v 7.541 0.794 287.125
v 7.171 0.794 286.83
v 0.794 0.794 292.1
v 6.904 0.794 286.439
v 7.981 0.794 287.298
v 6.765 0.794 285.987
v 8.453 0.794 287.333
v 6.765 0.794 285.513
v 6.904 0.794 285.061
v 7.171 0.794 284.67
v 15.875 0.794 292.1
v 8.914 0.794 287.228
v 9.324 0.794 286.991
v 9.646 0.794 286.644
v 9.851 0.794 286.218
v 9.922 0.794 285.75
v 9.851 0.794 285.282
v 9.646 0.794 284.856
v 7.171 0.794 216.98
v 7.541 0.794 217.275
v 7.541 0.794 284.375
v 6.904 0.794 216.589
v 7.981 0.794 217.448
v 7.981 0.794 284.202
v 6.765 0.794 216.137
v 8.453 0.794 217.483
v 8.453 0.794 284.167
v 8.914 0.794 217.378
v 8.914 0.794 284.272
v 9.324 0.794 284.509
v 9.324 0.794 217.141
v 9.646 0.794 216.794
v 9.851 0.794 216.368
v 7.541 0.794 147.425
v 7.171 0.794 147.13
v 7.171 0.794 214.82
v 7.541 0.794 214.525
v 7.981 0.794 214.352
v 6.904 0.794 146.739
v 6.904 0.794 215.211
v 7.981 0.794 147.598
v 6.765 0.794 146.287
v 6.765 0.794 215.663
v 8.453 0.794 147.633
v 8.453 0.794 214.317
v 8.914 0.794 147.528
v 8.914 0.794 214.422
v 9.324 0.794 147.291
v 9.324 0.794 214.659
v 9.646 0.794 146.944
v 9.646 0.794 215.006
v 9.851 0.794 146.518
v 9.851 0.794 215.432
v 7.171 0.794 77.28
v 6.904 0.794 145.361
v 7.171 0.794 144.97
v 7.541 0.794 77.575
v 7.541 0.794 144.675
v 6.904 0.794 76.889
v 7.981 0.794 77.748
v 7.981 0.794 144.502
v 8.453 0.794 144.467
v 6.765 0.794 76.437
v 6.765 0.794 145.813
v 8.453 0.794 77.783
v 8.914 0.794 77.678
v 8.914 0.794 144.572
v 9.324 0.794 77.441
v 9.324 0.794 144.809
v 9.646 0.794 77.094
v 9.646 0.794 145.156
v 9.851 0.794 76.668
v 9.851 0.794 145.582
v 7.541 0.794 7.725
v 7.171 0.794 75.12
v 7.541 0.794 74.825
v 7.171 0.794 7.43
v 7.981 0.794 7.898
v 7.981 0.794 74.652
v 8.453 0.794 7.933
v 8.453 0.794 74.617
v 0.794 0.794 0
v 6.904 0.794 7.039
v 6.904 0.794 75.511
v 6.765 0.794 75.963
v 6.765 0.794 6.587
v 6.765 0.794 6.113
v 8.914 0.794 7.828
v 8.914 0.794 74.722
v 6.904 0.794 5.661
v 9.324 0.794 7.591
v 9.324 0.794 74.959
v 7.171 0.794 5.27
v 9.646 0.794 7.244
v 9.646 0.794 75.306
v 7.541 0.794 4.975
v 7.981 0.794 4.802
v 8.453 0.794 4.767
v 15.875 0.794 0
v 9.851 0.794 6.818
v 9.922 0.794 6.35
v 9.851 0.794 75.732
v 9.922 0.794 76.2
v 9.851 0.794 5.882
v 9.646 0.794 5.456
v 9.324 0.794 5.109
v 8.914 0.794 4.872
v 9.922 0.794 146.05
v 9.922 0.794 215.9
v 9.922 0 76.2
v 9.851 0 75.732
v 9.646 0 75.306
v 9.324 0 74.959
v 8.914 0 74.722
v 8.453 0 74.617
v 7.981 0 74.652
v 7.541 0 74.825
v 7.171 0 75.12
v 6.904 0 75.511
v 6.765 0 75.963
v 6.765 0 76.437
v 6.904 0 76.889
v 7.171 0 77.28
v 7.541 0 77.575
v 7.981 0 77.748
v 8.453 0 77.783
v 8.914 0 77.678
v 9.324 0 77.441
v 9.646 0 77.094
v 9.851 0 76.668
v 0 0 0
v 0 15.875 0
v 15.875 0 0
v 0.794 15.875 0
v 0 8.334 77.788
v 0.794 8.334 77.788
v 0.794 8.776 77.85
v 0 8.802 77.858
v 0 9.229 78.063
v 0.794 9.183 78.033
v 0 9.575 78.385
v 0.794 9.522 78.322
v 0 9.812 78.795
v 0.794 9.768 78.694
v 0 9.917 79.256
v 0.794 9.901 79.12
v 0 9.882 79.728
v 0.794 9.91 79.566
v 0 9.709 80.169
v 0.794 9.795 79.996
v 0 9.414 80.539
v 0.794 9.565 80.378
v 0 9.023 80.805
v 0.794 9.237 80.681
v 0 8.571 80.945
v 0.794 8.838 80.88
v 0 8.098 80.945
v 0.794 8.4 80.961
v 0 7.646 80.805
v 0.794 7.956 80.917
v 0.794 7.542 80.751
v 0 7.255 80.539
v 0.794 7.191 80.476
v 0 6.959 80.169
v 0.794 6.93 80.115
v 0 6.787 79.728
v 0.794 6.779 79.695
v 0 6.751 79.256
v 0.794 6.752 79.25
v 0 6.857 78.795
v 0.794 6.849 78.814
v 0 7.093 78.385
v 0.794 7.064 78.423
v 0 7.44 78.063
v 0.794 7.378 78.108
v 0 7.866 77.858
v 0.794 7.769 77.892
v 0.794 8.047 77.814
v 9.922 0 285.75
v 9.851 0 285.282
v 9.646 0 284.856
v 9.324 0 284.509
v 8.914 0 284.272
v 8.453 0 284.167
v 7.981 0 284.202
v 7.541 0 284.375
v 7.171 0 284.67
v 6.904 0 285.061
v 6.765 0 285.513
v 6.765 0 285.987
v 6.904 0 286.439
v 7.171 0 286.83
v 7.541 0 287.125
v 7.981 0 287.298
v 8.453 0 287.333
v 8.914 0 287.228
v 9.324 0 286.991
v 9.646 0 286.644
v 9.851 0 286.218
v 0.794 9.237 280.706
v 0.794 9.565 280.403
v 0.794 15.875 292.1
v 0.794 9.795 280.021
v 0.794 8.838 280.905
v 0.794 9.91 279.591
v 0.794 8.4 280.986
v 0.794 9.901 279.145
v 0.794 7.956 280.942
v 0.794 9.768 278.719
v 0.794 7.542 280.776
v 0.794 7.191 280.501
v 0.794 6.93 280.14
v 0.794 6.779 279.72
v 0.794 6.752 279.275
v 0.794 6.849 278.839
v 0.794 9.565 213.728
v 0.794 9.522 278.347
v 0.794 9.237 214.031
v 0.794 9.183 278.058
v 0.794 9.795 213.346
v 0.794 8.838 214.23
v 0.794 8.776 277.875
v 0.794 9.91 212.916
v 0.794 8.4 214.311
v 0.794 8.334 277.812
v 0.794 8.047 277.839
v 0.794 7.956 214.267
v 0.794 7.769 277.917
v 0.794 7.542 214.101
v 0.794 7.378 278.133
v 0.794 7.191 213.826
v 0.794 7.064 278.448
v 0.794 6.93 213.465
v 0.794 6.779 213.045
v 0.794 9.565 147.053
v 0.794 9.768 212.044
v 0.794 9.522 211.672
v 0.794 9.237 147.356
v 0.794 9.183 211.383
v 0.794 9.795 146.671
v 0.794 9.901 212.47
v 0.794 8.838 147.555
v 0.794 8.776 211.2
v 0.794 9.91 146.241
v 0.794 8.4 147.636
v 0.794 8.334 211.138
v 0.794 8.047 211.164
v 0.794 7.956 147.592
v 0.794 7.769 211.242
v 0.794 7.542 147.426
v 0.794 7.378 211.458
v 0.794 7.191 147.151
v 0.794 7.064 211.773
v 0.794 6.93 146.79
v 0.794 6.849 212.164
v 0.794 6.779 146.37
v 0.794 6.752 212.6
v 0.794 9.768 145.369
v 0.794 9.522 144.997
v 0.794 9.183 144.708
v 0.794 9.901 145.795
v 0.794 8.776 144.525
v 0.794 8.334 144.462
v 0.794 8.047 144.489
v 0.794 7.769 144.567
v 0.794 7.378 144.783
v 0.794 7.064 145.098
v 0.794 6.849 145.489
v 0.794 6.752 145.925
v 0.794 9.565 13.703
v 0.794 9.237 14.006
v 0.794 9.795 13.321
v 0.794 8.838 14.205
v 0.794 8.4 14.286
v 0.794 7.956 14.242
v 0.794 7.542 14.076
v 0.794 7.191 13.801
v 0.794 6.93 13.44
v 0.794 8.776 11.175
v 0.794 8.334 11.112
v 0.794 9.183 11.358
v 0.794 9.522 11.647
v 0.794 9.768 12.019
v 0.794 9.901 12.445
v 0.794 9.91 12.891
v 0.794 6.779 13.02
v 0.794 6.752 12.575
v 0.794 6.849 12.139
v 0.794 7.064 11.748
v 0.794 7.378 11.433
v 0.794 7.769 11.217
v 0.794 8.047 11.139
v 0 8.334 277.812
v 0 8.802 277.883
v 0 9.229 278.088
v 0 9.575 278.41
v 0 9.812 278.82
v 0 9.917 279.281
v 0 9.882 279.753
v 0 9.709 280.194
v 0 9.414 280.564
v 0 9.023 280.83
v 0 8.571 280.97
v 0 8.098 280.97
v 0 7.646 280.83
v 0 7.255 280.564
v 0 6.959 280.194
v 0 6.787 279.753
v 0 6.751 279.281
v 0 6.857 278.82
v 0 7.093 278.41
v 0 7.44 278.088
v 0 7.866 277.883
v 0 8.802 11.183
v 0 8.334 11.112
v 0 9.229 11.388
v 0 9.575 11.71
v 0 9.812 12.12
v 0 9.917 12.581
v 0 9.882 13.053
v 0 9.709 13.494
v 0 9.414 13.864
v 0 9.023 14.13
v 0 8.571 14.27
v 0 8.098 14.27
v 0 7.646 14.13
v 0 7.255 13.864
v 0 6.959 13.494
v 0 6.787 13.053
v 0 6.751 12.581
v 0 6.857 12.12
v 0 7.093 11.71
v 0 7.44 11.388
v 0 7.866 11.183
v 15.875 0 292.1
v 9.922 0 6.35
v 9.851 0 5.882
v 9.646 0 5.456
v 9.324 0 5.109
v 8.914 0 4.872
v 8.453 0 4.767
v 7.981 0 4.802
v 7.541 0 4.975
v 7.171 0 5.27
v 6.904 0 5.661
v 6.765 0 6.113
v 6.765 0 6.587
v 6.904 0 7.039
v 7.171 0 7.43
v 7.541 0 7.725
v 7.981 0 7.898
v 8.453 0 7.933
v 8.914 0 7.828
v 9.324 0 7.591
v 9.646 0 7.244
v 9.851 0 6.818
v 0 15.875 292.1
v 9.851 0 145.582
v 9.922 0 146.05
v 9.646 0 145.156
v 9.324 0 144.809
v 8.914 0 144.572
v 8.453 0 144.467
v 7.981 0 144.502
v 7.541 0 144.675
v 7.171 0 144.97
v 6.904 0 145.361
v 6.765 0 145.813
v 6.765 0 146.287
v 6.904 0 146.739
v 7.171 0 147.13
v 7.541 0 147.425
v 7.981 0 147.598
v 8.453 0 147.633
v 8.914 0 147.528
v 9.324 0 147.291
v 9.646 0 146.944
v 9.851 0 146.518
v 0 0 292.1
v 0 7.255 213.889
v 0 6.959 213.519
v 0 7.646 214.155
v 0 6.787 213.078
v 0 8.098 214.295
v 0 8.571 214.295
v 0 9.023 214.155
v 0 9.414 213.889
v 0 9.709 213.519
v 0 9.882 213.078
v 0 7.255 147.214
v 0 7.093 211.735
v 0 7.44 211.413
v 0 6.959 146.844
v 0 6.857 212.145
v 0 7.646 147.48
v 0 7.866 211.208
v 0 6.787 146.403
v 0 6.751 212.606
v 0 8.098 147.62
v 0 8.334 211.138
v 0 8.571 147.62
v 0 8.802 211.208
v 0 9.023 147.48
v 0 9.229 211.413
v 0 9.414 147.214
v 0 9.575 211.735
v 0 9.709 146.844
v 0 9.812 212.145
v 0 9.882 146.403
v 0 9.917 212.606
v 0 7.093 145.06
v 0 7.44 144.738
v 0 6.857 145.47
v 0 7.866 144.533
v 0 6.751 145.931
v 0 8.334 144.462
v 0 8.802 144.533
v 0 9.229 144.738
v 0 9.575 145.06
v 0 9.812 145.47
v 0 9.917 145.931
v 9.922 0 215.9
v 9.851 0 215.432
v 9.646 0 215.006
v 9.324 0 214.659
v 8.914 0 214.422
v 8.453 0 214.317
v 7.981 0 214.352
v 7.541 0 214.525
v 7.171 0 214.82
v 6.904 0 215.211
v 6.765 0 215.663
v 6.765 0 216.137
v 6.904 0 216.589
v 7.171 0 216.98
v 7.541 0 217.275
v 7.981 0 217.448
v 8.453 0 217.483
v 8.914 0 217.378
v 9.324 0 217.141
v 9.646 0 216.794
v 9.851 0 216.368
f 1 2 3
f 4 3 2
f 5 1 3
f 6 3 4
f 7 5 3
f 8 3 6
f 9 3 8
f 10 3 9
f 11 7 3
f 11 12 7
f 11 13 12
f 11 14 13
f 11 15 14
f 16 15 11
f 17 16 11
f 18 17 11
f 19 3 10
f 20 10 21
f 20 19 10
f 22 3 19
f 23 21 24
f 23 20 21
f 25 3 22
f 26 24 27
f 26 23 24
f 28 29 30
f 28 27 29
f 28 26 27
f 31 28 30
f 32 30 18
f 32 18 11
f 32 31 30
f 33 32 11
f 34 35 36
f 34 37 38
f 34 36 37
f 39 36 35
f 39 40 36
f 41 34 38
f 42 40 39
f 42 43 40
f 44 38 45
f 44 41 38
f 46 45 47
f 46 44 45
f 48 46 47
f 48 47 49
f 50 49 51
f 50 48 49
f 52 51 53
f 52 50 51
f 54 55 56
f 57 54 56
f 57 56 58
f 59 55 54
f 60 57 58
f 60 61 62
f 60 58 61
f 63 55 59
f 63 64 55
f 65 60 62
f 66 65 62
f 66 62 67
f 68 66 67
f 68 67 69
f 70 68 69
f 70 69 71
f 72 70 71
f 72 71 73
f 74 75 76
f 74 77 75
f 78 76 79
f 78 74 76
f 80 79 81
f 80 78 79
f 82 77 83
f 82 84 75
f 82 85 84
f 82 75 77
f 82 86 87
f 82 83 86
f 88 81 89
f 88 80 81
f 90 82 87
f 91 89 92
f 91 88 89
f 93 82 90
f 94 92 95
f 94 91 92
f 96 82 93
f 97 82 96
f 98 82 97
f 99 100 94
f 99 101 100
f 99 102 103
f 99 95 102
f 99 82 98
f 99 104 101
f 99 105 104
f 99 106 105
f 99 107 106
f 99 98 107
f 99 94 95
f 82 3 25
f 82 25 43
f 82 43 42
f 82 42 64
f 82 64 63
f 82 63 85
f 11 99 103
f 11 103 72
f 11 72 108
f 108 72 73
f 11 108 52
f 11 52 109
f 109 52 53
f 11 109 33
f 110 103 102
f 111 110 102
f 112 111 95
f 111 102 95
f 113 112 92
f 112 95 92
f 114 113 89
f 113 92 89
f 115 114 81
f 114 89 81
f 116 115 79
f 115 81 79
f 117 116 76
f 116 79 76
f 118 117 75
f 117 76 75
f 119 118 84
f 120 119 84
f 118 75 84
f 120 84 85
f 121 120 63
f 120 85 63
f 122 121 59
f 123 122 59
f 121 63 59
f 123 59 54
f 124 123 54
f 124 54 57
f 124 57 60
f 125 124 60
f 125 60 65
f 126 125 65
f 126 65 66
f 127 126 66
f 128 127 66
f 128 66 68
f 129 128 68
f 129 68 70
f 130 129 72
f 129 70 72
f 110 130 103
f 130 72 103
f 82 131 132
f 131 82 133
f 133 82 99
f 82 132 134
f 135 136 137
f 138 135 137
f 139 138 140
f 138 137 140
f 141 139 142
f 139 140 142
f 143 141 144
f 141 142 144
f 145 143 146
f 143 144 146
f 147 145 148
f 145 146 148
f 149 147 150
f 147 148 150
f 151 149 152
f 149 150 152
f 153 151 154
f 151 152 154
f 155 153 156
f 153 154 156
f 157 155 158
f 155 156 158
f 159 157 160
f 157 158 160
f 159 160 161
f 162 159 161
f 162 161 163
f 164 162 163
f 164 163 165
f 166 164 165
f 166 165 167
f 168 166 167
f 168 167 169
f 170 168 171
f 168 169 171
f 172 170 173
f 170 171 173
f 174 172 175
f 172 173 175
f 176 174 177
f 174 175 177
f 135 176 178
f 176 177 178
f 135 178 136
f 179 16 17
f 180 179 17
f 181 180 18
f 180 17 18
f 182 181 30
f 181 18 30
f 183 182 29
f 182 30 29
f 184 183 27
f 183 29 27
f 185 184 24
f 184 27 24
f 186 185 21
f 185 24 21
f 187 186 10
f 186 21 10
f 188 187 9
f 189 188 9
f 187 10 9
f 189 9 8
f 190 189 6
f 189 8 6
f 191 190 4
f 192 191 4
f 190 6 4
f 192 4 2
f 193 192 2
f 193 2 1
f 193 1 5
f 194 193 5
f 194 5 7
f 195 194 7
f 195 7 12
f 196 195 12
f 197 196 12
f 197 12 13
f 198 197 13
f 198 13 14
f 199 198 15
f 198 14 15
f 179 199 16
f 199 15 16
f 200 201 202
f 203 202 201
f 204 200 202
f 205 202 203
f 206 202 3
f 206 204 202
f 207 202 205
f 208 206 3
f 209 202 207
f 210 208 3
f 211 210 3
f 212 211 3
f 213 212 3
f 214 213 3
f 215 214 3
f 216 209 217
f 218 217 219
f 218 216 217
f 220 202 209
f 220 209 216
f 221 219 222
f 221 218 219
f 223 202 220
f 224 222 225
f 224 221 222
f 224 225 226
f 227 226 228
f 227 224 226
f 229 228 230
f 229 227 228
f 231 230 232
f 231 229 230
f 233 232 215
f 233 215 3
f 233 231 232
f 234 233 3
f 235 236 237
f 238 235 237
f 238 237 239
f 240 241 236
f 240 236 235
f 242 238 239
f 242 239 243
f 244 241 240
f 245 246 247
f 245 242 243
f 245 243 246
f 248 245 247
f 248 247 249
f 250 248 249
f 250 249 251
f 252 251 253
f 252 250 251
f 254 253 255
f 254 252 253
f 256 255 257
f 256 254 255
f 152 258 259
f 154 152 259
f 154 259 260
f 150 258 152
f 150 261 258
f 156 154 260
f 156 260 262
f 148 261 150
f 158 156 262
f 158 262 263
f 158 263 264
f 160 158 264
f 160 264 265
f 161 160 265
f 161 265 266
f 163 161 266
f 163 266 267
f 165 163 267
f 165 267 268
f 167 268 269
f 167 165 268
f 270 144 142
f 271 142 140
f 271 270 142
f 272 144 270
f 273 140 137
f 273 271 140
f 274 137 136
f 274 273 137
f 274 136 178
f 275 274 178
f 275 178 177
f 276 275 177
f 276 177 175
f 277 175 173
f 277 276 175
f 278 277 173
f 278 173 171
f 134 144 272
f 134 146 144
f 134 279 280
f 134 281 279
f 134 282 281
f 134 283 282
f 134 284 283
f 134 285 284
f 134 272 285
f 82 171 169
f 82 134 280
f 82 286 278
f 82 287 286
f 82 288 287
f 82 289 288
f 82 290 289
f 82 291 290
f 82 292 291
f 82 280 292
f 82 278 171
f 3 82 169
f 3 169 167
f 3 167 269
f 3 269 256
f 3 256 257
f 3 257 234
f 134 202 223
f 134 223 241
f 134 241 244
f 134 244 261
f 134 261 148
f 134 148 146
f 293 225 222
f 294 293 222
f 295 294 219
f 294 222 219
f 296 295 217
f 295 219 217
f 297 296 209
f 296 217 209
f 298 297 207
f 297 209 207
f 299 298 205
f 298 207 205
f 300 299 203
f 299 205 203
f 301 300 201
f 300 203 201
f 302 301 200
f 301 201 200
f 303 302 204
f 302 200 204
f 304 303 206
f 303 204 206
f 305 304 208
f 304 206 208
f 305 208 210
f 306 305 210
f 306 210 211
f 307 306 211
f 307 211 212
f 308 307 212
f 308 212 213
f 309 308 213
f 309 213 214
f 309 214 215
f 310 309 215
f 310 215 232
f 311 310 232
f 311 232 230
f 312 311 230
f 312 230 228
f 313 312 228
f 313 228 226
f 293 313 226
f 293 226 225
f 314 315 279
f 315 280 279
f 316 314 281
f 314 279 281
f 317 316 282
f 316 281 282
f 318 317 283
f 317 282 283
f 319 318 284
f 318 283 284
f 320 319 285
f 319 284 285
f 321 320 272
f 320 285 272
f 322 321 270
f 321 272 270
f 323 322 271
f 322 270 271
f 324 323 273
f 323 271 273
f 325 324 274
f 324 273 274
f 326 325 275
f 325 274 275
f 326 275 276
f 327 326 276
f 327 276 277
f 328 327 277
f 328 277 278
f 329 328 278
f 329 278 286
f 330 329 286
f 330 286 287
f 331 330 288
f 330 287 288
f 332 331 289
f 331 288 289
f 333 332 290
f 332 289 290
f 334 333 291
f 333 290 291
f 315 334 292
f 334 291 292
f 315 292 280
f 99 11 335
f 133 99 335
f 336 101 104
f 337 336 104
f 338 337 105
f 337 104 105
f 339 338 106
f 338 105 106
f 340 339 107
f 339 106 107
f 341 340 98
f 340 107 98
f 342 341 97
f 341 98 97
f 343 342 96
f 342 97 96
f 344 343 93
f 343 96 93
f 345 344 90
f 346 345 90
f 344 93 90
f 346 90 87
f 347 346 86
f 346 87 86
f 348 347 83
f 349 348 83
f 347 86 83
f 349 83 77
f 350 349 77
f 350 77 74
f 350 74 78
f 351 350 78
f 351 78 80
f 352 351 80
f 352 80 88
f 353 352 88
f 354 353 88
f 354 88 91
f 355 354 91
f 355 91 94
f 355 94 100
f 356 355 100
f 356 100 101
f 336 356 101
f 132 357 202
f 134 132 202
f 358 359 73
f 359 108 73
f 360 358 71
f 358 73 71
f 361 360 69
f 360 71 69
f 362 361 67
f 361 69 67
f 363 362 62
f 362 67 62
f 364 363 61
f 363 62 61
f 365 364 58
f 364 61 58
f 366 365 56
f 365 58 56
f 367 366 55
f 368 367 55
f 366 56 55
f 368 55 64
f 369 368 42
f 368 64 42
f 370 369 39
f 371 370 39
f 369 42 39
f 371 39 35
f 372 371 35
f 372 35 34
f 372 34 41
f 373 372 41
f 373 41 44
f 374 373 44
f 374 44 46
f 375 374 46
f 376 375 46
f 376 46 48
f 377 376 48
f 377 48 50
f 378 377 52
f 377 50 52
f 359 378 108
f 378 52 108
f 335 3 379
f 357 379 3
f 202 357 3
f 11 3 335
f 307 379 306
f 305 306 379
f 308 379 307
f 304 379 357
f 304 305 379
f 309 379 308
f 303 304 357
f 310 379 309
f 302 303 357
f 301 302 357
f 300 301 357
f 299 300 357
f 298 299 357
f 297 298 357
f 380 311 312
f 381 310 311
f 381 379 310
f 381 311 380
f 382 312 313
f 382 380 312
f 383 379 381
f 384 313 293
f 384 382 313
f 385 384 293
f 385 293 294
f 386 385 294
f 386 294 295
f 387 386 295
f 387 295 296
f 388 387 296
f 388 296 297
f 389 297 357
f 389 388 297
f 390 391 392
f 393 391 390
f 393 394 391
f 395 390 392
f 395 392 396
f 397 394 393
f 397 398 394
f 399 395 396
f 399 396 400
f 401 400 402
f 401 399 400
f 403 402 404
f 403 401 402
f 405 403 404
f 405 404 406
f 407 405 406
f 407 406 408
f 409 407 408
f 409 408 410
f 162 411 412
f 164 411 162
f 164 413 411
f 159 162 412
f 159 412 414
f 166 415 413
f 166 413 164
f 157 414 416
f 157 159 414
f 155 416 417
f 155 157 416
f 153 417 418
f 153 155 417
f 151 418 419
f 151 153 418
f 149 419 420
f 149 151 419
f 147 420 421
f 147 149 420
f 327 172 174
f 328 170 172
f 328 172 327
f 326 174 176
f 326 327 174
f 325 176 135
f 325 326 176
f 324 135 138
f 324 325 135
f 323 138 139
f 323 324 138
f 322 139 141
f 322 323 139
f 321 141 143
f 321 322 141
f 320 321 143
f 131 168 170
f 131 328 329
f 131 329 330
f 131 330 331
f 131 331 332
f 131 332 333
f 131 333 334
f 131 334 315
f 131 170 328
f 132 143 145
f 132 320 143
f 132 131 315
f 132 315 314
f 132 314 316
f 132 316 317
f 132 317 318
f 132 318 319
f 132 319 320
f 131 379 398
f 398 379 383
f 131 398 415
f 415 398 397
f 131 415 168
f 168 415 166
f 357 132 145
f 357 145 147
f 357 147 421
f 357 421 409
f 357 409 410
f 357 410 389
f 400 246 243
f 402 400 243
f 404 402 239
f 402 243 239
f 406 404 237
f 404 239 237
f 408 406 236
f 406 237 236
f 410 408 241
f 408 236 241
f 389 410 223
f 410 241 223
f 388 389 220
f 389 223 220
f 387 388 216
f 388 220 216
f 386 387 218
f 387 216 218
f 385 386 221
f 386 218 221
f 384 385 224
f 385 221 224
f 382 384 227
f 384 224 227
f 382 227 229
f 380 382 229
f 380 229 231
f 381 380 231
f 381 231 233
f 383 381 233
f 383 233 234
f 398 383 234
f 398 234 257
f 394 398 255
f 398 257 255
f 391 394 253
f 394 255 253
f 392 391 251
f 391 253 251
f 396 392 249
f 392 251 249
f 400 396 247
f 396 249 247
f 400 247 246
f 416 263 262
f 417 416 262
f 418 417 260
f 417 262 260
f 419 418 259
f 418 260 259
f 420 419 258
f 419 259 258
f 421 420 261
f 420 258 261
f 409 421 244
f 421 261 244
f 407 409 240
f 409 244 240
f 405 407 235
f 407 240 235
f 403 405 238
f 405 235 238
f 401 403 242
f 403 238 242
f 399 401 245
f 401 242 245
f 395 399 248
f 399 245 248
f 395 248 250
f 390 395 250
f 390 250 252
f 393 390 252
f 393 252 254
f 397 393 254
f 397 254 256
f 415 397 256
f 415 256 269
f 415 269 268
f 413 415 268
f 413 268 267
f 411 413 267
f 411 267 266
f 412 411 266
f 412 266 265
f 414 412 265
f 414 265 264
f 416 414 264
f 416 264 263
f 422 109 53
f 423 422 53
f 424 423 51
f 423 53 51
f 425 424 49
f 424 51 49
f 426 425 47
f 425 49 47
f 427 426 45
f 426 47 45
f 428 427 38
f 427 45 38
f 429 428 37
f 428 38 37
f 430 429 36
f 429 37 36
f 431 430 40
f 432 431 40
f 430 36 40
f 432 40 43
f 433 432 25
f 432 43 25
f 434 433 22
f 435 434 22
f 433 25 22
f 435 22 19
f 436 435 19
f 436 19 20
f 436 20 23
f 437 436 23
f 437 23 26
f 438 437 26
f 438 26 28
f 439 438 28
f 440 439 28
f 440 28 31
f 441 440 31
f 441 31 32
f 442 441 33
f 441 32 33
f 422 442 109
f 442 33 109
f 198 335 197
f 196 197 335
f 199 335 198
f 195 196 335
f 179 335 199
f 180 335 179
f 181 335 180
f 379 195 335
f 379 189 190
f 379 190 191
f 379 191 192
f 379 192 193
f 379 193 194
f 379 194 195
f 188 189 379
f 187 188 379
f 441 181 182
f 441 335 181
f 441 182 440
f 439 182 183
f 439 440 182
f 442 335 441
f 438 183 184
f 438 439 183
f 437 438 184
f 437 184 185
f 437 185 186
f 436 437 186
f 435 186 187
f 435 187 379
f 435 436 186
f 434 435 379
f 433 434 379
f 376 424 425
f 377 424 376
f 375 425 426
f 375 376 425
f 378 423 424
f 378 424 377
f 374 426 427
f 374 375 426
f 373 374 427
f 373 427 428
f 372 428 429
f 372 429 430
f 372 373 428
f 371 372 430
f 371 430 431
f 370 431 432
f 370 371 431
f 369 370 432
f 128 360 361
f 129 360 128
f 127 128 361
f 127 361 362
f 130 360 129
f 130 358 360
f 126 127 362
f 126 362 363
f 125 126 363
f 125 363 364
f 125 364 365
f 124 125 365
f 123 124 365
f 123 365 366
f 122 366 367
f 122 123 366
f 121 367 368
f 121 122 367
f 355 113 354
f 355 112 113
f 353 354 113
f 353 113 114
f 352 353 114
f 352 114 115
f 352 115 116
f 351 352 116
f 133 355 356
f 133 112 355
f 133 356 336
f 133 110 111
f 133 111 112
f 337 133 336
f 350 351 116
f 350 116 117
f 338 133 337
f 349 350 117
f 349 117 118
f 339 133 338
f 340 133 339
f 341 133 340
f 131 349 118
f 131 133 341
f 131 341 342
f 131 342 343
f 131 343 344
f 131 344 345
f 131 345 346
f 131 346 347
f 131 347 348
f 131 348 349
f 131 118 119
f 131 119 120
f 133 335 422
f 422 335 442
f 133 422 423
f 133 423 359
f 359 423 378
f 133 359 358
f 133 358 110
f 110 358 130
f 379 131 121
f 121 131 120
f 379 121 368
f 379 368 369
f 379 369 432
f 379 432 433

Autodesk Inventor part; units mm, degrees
ref_plane "YZ Plane" through (0, 0, 0) normal (1, 0, 0) x (0, 1, 0)
ref_plane "XZ Plane" through (0, 0, 0) normal (0, 1, 0) x (-1, 0, 0)
ref_plane "XY Plane" through (0, 0, 0) normal (0, 0, 1) x (1, 0, 0)
sketch "Sketch1" plane through (0, 0, 0) normal (0, 0, 1) x (1, 0, 0)
  line L0 (0, 0) -> (0, 15.875)
  line L1 (0, 15.875) -> (0.7937, 15.875)
  line L2 (0.7937, 15.875) -> (0.7938, 0.7937)
  line L3 (0.7938, 0.7937) -> (15.875, 0.7937)
  line L4 (15.875, 0.7937) -> (15.875, 0)
  line L5 (15.875, 0) -> (0, 0)
  dimension "d0" = 15.875
  dimension "d1" = 0.7937
extrude "Extrusion1" add sketch "Sketch1" along normal blind 292.1
sketch "Sketch2" plane through (0.7938, 0.7937, 0) normal (0, 1, 0) x (1, 0, 0)
  line L0 (0, 0) -> (15.0812, 0) projected
  line L1 (15.0812, -292.1) -> (0, -292.1) projected
  line L2 (7.5406, 0) -> (7.5406, -292.1) construction
  circle A0 centre (7.5406, -6.35) radius 1.5875
  circle A1 centre (7.5406, -76.2) radius 1.5875
  circle A2 centre (7.5406, -146.05) radius 1.5875
  circle A3 centre (7.5406, -215.9) radius 1.5875
  circle A4 centre (7.5406, -285.75) radius 1.5875
  point P0 (-0.7938, 0)
  dimension "d4" = 6.35
  dimension "d5" = 3.175
  dimension "d6" = 292.1
  dimension "d9" = 69.85
sketch "Sketch3" plane through (0.7938, 0.7937, 0) normal (1, 0, 0) x (0, 0, -1)
  line L0 (0, 15.0812) -> (0, 0) projected
  line L1 (-292.1, 0) -> (-292.1, 15.0812) projected
  line L2 (-292.1, 7.5406) -> (0, 7.5406) construction
  circle A0 centre (-12.7, 7.5406) radius 1.5875
  circle A1 centre (-79.375, 7.5406) radius 1.5875
  circle A2 centre (-146.05, 7.5406) radius 1.5875
  circle A3 centre (-212.725, 7.5406) radius 1.5875
  circle A4 centre (-279.4, 7.5406) radius 1.5875
  point P0 (0, -0.7937)
  dimension "d14" = 3.175
  dimension "d15" = 12.7
  dimension "d16" = 292.1
  dimension "d19" = 66.675
extrude "Extrusion2" cut sketch "Sketch2" against normal through all
extrude "Extrusion3" cut sketch "Sketch3" against normal through all
equation "\"d9\" = -0.5 * d4 + 0.25 * d6"
equation "\"d19\" = -0.5 * d15 + 0.25 * d16"
properties part number "Hopper Bracing Top Left P4" material "Aluminum 6061"
